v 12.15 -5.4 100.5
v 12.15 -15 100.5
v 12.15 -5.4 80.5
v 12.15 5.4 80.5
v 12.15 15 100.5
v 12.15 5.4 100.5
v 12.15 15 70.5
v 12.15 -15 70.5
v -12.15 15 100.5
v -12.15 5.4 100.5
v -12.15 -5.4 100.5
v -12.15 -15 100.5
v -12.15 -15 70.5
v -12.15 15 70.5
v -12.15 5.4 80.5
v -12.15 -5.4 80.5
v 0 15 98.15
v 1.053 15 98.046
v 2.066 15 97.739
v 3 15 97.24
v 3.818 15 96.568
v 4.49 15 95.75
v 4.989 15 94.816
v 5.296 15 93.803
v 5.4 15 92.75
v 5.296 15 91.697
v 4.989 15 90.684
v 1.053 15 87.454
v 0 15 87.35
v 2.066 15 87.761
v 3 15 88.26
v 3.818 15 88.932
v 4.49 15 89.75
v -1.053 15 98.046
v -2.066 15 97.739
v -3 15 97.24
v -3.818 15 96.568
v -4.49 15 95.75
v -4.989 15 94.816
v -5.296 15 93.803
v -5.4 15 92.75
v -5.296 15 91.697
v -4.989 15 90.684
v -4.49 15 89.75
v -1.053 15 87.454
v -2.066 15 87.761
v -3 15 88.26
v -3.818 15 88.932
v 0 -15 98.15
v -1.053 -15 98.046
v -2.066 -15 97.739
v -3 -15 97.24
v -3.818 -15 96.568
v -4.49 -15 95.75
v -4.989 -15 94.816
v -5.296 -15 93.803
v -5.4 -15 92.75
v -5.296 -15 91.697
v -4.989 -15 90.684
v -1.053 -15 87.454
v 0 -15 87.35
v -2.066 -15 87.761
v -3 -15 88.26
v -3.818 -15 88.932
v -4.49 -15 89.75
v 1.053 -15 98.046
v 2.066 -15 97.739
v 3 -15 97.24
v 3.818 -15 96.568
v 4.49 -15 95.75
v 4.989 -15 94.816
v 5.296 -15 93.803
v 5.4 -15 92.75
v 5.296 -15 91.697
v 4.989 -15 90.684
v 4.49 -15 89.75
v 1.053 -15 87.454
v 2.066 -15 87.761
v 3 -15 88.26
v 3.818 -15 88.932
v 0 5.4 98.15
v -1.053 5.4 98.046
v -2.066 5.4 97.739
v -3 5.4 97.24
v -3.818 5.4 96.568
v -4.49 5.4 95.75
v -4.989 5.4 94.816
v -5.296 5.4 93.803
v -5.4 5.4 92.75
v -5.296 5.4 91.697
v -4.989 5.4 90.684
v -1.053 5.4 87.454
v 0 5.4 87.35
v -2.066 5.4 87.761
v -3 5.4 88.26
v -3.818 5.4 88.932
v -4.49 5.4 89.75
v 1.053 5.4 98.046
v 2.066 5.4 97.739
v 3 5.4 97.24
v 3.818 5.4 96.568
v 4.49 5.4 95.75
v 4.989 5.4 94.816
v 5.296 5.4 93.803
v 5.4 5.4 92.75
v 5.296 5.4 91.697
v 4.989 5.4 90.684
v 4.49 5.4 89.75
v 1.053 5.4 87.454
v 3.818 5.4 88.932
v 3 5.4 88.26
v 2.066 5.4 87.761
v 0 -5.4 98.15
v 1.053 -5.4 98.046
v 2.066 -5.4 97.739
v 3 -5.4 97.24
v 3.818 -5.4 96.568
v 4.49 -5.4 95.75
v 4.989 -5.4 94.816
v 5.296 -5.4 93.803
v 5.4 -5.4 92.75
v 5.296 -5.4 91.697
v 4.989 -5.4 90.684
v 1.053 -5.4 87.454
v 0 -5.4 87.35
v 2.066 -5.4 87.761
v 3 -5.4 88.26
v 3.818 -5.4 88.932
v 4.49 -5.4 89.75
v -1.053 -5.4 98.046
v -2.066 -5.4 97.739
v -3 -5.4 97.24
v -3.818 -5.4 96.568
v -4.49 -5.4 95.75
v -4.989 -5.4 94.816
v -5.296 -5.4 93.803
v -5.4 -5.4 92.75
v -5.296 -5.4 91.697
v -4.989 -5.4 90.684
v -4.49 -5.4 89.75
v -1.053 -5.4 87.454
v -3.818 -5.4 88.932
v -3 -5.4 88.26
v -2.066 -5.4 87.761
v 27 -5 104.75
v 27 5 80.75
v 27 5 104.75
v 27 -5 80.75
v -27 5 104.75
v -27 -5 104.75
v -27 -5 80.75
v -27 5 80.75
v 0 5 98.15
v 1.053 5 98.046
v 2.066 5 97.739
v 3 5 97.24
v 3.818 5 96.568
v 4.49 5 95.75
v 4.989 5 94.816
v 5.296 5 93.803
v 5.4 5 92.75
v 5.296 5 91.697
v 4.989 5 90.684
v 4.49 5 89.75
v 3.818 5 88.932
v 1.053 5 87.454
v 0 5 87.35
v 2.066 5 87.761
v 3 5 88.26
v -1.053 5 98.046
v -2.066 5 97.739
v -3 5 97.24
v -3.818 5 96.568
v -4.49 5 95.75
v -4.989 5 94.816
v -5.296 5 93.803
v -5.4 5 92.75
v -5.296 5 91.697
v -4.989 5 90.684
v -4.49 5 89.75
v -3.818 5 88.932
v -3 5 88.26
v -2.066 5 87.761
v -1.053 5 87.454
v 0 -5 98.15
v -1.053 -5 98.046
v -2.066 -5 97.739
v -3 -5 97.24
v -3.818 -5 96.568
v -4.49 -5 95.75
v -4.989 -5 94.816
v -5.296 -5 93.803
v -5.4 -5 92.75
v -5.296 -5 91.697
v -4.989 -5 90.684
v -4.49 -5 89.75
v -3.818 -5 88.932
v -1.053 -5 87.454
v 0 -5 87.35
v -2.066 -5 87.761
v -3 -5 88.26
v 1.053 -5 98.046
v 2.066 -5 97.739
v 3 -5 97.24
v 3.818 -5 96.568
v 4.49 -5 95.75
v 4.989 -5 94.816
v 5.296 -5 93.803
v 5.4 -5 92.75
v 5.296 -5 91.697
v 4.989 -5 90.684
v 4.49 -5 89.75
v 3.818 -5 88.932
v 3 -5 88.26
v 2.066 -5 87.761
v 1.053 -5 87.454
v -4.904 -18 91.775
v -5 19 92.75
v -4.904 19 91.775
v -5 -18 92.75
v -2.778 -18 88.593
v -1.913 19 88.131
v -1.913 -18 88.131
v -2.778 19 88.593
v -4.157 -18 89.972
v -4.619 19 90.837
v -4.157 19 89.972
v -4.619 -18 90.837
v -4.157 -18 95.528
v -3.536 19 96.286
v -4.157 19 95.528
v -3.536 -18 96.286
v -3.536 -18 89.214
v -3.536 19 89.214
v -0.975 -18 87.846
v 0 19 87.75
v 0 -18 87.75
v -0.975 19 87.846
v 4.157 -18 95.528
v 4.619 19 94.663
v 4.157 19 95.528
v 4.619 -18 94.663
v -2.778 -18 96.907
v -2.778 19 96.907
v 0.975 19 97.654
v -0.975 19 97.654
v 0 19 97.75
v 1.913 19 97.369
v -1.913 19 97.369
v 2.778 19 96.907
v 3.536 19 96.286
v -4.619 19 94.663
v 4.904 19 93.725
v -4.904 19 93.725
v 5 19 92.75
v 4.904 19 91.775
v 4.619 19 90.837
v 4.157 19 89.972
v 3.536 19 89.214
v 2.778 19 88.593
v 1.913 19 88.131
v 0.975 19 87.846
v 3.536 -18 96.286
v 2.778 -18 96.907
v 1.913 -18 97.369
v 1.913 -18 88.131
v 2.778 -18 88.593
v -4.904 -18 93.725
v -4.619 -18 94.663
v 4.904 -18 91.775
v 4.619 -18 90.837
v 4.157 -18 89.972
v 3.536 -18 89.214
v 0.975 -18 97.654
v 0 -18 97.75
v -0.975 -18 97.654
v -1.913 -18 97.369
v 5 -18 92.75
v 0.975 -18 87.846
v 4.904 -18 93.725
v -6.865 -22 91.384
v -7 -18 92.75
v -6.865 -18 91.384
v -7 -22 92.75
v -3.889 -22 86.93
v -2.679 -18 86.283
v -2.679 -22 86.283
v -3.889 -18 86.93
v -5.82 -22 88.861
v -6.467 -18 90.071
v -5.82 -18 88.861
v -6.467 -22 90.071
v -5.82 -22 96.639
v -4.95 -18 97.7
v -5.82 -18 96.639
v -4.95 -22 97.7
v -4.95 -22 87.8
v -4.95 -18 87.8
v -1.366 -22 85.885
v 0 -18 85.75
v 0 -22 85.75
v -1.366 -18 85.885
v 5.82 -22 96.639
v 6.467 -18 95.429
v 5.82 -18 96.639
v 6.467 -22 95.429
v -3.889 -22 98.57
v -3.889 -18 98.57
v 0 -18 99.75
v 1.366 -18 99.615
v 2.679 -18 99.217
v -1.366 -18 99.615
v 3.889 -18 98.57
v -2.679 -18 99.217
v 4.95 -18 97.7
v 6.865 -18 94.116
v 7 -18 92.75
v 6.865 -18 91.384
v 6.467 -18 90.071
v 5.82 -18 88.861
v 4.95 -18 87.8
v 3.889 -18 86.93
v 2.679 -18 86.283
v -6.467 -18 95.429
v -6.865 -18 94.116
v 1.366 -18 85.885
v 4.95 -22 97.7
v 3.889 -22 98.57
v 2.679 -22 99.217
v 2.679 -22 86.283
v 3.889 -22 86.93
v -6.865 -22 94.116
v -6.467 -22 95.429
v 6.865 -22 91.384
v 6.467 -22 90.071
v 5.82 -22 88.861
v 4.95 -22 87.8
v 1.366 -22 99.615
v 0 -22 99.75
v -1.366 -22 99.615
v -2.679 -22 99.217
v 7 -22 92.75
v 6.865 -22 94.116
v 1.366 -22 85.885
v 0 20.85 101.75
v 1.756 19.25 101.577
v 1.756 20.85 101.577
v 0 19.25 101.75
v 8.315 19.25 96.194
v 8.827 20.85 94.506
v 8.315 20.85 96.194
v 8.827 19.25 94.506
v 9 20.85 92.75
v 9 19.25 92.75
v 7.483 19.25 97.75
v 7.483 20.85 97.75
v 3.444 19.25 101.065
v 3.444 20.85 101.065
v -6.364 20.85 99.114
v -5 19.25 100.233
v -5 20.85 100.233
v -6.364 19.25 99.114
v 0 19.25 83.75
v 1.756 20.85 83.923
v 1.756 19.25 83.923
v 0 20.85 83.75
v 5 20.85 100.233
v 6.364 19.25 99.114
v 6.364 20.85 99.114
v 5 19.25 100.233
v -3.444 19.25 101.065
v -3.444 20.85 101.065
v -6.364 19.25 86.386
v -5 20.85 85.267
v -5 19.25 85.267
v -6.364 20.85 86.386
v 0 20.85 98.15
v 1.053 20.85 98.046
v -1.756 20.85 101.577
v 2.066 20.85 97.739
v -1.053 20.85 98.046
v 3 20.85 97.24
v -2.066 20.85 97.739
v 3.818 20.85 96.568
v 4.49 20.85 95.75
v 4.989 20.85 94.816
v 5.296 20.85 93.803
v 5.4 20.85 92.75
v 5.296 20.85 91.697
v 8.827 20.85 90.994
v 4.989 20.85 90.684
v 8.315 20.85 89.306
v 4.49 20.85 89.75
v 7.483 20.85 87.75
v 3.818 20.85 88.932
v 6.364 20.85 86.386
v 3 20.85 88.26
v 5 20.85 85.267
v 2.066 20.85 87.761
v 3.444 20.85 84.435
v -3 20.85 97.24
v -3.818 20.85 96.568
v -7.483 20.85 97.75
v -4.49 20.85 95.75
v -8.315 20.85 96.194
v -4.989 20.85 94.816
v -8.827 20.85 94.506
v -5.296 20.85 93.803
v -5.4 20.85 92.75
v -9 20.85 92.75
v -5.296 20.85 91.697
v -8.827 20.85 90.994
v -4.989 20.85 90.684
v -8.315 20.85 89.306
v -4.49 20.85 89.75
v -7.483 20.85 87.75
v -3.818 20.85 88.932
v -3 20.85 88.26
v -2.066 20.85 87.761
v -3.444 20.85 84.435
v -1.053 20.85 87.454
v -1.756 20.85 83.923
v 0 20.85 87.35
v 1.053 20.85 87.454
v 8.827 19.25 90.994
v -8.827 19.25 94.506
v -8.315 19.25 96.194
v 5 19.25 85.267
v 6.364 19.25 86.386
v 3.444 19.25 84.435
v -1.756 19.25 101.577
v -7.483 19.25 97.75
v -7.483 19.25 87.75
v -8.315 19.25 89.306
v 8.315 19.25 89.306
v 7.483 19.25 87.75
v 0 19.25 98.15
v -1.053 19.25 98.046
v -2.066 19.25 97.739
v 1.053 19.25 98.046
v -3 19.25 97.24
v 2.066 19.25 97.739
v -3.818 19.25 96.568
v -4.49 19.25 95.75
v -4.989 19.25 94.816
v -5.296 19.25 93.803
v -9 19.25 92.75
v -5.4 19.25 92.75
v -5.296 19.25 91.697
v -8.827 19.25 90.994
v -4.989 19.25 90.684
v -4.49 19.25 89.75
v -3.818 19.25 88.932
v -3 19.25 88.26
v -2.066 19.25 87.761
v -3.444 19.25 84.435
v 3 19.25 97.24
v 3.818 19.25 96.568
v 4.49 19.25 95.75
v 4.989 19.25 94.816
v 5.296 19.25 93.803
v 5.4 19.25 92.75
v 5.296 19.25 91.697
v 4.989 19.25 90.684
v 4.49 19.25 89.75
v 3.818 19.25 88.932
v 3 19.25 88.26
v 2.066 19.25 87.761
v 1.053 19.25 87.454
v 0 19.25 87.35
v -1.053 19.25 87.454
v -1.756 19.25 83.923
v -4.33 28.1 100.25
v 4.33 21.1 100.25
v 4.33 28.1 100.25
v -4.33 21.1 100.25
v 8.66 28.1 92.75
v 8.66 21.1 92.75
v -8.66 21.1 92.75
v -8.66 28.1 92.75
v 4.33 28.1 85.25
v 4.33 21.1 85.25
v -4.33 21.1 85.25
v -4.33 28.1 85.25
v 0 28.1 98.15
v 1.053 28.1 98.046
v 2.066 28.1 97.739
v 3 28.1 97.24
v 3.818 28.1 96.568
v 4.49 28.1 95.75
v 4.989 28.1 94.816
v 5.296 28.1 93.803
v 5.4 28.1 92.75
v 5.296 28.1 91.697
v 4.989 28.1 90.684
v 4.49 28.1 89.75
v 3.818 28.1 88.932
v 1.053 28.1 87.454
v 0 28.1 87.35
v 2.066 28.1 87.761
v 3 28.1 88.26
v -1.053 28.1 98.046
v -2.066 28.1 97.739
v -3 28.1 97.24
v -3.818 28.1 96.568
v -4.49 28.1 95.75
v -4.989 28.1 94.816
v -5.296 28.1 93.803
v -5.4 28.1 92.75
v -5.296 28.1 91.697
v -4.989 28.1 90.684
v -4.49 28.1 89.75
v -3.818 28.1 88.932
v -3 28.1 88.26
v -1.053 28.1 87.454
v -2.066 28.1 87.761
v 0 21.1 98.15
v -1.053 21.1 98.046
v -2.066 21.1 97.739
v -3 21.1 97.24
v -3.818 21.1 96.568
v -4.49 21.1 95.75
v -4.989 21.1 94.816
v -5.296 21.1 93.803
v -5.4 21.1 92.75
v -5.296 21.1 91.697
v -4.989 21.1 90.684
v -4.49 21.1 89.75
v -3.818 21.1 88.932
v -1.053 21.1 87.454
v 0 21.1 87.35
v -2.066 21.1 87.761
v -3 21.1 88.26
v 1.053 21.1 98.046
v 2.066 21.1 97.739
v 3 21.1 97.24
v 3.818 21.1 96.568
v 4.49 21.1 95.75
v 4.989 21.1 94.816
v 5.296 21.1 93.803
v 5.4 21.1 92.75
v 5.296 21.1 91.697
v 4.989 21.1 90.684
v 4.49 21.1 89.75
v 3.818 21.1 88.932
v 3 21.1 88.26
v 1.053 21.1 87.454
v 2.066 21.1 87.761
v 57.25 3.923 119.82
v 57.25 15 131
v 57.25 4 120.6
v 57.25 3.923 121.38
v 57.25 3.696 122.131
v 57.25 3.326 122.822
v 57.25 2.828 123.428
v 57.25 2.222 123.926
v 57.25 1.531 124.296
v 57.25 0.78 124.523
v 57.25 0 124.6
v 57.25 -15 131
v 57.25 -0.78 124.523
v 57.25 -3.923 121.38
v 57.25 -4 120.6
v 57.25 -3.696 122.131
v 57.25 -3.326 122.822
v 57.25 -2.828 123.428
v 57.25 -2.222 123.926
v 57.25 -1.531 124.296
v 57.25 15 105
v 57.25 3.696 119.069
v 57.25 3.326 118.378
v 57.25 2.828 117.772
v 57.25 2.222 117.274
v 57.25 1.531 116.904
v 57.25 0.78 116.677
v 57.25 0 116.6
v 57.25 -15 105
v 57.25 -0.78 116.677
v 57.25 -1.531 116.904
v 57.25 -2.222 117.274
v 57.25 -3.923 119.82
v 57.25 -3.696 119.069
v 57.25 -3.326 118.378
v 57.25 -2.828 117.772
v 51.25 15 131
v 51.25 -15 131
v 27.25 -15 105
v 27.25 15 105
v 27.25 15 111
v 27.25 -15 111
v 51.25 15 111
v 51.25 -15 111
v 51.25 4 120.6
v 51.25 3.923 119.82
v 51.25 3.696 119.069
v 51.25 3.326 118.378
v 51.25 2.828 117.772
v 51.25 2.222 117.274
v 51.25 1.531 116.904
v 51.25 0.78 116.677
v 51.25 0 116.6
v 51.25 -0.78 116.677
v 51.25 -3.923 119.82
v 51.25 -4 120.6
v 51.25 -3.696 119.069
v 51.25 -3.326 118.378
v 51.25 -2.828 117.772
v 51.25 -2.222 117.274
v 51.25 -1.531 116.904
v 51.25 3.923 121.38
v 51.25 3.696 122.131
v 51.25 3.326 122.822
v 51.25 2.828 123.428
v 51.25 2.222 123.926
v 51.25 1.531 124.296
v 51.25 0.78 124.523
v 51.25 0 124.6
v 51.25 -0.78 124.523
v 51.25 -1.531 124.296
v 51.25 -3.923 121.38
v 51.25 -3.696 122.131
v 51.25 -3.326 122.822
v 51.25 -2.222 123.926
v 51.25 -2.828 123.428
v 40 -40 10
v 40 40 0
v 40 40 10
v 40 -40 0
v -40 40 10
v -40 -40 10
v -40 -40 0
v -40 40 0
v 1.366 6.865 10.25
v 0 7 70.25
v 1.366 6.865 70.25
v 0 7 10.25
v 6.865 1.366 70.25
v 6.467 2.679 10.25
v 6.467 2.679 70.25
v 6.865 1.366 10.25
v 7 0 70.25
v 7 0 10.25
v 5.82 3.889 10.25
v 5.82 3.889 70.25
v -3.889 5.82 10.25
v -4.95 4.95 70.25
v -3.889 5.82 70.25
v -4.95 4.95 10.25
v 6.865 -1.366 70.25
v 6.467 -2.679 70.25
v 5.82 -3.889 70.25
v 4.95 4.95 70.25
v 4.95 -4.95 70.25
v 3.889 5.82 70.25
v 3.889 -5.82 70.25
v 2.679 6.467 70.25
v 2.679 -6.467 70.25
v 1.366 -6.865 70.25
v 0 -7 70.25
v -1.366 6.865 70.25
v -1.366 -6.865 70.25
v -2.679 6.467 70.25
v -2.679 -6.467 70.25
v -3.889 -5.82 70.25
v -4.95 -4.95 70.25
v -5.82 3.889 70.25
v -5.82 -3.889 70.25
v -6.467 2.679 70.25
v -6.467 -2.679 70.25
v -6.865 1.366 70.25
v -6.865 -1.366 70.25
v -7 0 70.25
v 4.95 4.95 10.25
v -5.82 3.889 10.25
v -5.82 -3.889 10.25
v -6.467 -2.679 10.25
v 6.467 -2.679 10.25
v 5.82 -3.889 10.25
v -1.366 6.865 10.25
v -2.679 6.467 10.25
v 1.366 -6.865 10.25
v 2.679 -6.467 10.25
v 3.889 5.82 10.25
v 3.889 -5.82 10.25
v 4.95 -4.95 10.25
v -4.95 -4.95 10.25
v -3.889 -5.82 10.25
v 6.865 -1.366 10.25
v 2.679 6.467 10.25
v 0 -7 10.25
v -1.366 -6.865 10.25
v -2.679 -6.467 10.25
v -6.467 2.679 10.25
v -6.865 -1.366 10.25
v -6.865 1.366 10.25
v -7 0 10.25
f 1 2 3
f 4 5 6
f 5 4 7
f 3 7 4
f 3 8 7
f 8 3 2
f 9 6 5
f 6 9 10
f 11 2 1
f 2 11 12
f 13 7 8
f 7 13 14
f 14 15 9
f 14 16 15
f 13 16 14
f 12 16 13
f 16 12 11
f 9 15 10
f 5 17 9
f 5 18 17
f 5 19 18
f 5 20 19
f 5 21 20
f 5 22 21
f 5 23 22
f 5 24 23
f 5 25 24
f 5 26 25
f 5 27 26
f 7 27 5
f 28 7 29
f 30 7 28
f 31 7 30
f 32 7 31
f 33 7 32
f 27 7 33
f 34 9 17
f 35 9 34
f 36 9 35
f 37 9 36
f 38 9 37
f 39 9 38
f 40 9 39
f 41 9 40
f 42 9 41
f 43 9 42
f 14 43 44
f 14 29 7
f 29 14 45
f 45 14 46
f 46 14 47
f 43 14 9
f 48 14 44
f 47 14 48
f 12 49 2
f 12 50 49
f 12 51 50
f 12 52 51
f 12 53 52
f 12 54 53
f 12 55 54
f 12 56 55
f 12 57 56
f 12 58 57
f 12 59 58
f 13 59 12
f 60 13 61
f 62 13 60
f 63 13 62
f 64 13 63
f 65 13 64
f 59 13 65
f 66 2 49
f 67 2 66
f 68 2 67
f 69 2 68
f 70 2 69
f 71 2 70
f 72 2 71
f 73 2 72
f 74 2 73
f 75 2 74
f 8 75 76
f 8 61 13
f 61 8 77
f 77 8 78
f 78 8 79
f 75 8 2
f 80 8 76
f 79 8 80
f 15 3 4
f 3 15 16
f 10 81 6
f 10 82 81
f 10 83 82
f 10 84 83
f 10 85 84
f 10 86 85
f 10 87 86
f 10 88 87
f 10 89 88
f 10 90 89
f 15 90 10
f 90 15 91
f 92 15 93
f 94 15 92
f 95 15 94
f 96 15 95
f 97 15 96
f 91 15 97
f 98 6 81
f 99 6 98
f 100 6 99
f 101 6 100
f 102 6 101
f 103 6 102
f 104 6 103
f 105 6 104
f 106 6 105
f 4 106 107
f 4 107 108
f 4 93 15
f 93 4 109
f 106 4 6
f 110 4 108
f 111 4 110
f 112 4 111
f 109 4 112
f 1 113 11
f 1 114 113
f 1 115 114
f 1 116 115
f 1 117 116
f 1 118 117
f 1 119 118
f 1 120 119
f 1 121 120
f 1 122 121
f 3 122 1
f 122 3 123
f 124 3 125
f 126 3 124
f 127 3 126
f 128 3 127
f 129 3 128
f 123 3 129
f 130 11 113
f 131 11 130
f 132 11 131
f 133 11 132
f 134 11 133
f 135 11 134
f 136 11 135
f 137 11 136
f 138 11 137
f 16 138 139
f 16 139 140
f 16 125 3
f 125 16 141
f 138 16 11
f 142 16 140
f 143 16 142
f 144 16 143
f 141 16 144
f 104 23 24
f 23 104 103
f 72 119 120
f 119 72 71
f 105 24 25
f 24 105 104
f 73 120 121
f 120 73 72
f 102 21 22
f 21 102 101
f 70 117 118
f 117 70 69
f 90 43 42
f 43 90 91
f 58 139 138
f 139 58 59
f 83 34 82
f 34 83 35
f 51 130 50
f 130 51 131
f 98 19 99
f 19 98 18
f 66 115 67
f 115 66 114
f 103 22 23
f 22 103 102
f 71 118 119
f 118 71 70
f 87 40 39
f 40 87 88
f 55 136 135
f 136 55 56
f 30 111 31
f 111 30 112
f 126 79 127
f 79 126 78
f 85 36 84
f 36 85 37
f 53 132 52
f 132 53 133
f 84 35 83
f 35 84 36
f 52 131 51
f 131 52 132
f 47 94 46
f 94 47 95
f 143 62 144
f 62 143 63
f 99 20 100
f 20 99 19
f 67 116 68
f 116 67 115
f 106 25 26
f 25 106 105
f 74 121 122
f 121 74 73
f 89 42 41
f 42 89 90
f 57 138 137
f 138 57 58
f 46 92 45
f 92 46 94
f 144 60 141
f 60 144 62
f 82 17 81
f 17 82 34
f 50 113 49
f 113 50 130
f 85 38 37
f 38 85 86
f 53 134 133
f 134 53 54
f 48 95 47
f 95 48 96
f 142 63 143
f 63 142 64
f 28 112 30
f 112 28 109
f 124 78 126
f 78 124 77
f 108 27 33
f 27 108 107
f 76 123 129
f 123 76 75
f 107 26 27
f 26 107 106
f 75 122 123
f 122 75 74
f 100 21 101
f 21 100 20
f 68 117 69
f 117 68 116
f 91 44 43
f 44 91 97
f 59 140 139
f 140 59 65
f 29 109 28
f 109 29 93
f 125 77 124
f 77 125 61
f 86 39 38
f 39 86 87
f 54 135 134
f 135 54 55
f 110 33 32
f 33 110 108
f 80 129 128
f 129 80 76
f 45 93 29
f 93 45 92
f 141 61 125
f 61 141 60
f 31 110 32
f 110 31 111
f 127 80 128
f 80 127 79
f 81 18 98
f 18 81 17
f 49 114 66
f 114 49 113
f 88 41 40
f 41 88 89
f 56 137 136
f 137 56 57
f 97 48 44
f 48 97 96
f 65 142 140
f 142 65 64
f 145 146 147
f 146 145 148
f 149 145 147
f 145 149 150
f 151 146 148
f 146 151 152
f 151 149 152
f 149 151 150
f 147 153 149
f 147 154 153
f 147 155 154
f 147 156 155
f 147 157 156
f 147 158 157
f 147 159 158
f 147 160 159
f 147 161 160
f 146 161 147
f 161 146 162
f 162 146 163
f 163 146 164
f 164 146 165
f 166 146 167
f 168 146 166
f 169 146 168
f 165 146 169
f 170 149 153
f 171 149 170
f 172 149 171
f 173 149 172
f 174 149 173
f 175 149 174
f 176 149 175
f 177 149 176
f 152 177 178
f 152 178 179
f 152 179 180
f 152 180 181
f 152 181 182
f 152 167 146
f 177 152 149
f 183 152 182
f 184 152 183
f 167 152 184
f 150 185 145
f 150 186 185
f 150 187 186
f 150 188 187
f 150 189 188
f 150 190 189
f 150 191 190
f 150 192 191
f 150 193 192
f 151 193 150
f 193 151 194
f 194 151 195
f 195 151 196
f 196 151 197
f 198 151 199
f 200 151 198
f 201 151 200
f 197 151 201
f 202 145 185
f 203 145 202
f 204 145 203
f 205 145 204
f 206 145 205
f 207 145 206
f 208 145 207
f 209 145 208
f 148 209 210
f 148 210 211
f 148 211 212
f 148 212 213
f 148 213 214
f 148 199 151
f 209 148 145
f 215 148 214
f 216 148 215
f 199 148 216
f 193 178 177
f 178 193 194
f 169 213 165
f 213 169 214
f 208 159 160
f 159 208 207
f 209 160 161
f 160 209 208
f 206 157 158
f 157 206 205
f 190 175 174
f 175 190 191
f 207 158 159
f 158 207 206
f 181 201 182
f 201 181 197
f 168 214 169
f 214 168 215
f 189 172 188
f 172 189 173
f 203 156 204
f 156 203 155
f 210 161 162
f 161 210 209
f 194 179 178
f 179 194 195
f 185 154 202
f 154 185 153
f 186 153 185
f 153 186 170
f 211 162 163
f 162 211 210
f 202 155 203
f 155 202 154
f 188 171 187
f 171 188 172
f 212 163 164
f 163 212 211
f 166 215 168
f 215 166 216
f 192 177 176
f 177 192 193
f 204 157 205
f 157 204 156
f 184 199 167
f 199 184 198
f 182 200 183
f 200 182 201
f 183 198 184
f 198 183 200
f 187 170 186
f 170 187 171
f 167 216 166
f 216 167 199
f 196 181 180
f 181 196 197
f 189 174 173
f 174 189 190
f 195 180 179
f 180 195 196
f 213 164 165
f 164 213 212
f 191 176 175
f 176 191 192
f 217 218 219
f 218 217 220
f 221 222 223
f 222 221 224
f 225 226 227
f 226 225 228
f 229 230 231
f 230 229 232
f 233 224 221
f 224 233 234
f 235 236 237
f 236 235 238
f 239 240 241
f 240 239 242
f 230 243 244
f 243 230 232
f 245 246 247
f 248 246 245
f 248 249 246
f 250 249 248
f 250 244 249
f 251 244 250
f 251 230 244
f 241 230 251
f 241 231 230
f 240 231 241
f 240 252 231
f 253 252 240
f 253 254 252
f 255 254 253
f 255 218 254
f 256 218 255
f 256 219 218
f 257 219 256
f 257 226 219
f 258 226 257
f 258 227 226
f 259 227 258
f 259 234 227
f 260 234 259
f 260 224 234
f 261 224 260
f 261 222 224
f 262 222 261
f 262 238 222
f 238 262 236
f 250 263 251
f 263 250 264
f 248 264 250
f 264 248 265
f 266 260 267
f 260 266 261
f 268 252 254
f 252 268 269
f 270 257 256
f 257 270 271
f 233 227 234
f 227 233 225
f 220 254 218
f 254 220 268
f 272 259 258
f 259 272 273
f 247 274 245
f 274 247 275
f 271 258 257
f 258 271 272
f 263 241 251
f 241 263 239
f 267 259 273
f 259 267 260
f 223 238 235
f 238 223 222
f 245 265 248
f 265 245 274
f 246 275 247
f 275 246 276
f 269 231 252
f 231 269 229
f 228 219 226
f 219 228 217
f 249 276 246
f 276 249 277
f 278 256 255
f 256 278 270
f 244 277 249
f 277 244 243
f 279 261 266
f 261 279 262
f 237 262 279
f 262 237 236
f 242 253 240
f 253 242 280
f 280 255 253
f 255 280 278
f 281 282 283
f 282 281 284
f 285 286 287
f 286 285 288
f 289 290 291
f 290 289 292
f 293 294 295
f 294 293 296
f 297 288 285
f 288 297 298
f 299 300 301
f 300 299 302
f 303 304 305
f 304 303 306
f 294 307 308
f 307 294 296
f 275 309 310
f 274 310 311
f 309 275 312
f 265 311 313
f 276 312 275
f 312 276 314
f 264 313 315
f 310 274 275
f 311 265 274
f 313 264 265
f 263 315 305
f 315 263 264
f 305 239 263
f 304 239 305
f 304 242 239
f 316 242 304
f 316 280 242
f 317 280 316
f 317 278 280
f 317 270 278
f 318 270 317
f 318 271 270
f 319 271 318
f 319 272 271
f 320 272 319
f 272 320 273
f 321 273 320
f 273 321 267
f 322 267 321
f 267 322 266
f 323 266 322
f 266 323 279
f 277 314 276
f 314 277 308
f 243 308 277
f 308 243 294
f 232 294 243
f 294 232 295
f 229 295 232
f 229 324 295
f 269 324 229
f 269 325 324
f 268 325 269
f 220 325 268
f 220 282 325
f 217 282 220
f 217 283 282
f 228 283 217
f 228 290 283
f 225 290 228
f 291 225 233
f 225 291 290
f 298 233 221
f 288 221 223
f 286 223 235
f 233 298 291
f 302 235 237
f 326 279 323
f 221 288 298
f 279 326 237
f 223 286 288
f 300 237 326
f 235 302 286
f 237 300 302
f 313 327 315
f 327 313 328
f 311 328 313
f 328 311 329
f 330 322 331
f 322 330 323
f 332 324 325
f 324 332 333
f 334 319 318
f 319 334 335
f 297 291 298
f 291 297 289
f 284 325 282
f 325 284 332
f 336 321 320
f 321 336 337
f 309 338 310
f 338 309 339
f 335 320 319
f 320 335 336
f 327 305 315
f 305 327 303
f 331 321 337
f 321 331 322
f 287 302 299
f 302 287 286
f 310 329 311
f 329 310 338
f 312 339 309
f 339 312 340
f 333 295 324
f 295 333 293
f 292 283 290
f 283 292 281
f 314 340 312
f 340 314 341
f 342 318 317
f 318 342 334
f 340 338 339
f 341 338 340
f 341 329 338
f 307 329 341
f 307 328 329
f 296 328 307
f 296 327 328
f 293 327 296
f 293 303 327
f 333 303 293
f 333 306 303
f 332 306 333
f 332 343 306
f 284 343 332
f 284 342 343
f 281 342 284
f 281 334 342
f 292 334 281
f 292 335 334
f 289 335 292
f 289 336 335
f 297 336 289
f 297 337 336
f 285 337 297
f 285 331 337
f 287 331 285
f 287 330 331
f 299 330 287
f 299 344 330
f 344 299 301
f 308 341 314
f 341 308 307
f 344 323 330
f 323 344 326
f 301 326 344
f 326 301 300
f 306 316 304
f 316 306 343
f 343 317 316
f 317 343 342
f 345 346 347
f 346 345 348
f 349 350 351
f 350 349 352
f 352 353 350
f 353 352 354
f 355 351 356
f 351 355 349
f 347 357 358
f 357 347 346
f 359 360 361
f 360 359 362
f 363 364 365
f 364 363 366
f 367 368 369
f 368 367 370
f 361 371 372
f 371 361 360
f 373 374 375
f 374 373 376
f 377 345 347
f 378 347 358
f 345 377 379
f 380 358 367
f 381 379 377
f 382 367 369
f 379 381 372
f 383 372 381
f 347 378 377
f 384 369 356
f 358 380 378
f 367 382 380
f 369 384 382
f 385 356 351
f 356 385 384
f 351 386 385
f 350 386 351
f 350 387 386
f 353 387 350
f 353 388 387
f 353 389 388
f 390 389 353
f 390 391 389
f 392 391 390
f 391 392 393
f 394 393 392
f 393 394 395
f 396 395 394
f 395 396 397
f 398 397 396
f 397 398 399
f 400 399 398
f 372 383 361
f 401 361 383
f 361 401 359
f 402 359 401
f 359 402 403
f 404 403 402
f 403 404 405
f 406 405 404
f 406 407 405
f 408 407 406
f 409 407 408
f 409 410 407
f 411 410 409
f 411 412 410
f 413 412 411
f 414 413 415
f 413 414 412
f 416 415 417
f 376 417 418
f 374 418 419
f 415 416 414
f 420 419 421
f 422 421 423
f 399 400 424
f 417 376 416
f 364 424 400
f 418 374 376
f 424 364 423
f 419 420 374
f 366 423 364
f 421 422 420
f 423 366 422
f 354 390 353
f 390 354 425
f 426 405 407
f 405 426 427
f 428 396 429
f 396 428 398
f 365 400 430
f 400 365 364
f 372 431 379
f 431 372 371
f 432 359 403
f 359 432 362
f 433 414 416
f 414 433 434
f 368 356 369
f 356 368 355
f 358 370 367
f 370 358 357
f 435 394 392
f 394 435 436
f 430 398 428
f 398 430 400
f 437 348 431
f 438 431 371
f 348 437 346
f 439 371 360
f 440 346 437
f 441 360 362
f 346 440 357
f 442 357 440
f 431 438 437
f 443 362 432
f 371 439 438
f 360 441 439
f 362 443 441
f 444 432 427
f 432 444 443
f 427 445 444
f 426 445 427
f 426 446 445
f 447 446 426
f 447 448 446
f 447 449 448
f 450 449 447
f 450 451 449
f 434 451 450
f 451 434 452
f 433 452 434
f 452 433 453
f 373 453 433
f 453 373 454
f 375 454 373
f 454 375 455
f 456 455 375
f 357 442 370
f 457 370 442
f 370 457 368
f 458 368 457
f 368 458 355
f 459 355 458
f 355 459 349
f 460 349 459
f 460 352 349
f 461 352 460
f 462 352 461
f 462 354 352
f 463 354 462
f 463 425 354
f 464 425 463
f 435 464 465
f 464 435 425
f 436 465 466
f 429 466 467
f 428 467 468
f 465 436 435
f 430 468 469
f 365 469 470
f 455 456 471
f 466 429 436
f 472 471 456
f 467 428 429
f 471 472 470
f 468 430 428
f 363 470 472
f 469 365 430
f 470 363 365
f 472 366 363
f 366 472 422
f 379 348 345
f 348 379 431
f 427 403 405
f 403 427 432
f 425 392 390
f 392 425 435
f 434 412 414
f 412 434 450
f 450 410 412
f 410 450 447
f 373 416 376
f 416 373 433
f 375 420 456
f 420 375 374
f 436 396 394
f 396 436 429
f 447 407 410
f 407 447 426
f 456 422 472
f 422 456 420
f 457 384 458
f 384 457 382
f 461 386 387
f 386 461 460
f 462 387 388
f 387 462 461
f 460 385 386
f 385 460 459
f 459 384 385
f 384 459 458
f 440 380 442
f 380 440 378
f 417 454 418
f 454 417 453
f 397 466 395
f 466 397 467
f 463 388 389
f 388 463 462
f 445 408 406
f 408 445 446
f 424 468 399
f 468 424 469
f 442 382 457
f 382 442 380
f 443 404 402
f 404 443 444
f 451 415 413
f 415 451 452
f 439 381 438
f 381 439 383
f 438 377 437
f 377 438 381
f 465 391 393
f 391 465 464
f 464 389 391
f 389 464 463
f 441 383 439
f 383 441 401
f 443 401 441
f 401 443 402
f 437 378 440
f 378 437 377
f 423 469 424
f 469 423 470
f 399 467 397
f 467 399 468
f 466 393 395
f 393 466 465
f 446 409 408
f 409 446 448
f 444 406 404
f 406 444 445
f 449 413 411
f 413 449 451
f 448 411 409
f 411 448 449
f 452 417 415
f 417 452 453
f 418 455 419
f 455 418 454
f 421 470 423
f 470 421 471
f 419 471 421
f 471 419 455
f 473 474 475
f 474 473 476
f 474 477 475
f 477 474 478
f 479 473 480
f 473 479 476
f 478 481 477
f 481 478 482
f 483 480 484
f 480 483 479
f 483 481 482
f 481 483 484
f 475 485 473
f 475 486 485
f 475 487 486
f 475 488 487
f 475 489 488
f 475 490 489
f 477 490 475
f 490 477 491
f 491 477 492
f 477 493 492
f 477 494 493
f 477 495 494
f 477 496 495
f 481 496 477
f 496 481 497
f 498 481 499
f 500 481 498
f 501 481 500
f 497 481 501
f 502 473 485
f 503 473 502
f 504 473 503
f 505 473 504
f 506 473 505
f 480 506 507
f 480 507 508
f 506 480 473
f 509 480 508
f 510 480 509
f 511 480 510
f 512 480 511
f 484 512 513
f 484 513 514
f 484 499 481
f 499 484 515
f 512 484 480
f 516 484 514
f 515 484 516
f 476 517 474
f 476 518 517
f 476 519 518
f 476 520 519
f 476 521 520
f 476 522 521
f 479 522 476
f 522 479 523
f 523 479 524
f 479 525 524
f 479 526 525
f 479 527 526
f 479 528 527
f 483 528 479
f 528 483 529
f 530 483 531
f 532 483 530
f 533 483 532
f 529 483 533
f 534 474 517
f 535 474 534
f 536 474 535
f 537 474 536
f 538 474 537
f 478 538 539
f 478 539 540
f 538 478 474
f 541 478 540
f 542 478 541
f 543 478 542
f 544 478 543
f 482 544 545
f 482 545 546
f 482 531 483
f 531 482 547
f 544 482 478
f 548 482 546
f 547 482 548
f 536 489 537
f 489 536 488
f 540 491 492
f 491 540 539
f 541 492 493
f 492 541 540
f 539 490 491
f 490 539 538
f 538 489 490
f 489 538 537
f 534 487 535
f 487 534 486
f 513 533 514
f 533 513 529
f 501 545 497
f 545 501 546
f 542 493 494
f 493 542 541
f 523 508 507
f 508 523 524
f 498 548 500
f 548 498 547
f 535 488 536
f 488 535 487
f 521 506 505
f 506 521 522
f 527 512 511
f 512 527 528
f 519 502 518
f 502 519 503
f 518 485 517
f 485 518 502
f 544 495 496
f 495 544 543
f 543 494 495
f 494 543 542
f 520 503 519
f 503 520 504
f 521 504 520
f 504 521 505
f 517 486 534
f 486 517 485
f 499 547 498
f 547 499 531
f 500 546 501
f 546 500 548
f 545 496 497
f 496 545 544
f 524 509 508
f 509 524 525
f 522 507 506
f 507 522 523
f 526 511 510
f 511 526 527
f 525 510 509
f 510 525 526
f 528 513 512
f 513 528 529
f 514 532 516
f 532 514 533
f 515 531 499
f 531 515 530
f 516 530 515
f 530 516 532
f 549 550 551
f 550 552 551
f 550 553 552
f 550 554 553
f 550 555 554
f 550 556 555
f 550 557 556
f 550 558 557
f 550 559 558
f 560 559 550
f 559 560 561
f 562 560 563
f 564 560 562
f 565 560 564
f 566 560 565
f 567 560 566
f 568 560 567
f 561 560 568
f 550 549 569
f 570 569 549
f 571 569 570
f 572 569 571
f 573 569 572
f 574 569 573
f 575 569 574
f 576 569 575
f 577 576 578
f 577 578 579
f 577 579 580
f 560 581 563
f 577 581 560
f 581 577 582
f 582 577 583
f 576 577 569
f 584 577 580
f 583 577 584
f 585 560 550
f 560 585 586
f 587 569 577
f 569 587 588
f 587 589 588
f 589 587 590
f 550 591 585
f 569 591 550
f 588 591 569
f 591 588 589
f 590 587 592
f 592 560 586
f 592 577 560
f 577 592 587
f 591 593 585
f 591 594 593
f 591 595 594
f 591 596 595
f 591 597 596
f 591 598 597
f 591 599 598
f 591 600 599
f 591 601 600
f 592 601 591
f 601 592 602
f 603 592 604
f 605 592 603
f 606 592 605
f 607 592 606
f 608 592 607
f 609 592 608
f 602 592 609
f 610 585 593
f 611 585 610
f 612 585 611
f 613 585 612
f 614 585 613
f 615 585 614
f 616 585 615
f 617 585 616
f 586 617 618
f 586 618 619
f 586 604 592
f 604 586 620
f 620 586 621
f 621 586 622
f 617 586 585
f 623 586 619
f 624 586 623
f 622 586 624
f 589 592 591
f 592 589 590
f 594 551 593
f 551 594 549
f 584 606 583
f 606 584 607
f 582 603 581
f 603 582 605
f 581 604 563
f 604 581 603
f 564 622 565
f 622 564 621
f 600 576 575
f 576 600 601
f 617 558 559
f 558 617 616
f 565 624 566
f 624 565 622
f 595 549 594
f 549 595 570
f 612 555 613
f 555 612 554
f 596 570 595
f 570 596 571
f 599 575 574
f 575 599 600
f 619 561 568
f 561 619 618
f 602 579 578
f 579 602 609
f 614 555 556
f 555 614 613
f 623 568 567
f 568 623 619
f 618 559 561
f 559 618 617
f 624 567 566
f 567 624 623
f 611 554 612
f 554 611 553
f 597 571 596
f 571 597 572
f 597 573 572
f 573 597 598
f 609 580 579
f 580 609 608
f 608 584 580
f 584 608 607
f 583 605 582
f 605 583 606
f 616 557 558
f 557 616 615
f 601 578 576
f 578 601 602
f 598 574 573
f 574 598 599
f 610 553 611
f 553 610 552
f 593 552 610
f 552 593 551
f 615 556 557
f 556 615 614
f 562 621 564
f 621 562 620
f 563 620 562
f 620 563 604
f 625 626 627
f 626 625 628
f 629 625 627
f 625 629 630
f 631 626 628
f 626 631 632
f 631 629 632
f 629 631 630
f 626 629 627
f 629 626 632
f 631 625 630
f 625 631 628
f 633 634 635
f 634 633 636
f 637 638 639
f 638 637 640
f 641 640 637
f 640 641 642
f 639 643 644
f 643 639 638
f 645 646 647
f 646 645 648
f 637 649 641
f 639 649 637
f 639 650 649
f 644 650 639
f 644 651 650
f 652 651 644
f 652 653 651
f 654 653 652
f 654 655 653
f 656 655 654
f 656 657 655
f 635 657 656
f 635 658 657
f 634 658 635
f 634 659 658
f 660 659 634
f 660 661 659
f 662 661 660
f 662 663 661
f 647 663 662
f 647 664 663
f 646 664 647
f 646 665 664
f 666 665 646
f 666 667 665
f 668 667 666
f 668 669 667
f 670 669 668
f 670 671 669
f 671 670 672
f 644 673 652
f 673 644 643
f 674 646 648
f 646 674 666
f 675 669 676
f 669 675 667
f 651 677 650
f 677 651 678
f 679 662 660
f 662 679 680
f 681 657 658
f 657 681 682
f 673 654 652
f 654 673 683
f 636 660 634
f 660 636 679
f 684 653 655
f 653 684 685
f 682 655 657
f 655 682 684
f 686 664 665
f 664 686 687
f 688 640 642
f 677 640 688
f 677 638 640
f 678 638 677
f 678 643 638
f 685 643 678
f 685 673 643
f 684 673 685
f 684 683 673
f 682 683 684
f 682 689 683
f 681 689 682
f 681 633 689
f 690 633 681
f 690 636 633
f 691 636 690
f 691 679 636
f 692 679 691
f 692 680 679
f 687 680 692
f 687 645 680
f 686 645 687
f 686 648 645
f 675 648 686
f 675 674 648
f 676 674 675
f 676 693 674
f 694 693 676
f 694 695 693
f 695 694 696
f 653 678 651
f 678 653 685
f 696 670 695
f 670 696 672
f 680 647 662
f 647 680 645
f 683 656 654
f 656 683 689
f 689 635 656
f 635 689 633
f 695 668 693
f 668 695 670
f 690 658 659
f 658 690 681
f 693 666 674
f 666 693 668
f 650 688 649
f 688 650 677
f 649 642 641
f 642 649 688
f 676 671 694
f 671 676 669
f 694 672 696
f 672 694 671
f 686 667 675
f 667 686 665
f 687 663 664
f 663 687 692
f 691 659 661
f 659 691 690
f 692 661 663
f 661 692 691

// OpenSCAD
$fn = 32;

// ------------------------------------------------------------------------
// Lamp arm: column d14 x 60 mm, arm 54 mm
// Every part is its own module, assembly() places every instance.
// ------------------------------------------------------------------------

// --- part 1 ---
module lamp_base() {
  difference() {
    translate([-40, -40, 0]) cube([80, 80, 10]);
  }
}

// --- part 2 ---
module lamp_column() {
  cylinder(h = 60, d = 14);
}

// --- part 3 ---
module head_fork() {
  difference() {
    translate([-12.15, -15, 0]) cube([24.3, 30, 30]);
    translate([-13.15, -5.4, 10]) cube([26.3, 10.8, 21]);
    translate([0, 0, 22.25]) rotate([90, 0, 0]) cylinder(h = 32, d = 10.8, center = true);
  }
}

// --- part 4 ---
module lamp_arm() {
  difference() {
    translate([-27, -5, 0]) cube([54, 10, 24]);
    translate([0, 0, 12]) rotate([90, 0, 0]) cylinder(h = 12, d = 10.8, center = true);
  }
}

// --- part 5 ---
module arm_pin() {
  rotate([0, 90, 0]) cylinder(h = 38, d = 10, center = true);
  translate([-22, 0, 0]) rotate([0, 90, 0]) cylinder(h = 4, d = 14);
}

// --- part 6 ---
module arm_washer() {
  difference() {
      translate([0, 0, 0]) cylinder(h = 1.6, d = 18);
      translate([0, 0, -1]) cylinder(h = 3.6, d = 10.8);
    }
}

// --- part 7 ---
module arm_nut() {
  difference() {
    linear_extrude(height = 7) polygon(points = [[8.66, 0], [4.33, 7.5], [-4.33, 7.5], [-8.66, 0], [-4.33, -7.5], [4.33, -7.5]]);
    translate([0, 0, -1]) cylinder(h = 9, d = 10.8);
  }
}

// --- part 8 ---
module shade_bracket() {
  difference() {
    translate([-15, -15, 0]) cube([30, 30, 26]);
    translate([-16, -16, 6]) cube([25, 32, 21]);
    translate([12, 0, 15.6]) rotate([0, 90, 0]) cylinder(h = 8, d = 8, center = true);
  }
}

// --- assembly ---
module assembly() {
  color([0.80, 0.24, 0.20]) translate([0, 0, 0]) rotate([0, 0, 0]) lamp_base();
  color([0.20, 0.45, 0.75]) translate([0, 0, 10.25]) rotate([0, 0, 0]) lamp_column();
  color([0.25, 0.62, 0.32]) translate([0, 0, 70.5]) rotate([0, 0, 0]) head_fork();
  color([0.92, 0.70, 0.18]) translate([0, 0, 80.75]) rotate([0, 0, 0]) lamp_arm();
  color([0.58, 0.35, 0.70]) translate([0, 0, 92.75]) rotate([0, 0, 90]) arm_pin();
  color([0.16, 0.66, 0.66]) translate([0, 20.85, 92.75]) rotate([90, 0, 0]) arm_washer();
  color([0.85, 0.48, 0.18]) translate([0, 28.1, 92.75]) rotate([90, 0, 0]) arm_nut();
  color([0.55, 0.60, 0.65]) translate([42.25, 0, 105]) rotate([0, 0, 0]) shade_bracket();
}

assembly();
